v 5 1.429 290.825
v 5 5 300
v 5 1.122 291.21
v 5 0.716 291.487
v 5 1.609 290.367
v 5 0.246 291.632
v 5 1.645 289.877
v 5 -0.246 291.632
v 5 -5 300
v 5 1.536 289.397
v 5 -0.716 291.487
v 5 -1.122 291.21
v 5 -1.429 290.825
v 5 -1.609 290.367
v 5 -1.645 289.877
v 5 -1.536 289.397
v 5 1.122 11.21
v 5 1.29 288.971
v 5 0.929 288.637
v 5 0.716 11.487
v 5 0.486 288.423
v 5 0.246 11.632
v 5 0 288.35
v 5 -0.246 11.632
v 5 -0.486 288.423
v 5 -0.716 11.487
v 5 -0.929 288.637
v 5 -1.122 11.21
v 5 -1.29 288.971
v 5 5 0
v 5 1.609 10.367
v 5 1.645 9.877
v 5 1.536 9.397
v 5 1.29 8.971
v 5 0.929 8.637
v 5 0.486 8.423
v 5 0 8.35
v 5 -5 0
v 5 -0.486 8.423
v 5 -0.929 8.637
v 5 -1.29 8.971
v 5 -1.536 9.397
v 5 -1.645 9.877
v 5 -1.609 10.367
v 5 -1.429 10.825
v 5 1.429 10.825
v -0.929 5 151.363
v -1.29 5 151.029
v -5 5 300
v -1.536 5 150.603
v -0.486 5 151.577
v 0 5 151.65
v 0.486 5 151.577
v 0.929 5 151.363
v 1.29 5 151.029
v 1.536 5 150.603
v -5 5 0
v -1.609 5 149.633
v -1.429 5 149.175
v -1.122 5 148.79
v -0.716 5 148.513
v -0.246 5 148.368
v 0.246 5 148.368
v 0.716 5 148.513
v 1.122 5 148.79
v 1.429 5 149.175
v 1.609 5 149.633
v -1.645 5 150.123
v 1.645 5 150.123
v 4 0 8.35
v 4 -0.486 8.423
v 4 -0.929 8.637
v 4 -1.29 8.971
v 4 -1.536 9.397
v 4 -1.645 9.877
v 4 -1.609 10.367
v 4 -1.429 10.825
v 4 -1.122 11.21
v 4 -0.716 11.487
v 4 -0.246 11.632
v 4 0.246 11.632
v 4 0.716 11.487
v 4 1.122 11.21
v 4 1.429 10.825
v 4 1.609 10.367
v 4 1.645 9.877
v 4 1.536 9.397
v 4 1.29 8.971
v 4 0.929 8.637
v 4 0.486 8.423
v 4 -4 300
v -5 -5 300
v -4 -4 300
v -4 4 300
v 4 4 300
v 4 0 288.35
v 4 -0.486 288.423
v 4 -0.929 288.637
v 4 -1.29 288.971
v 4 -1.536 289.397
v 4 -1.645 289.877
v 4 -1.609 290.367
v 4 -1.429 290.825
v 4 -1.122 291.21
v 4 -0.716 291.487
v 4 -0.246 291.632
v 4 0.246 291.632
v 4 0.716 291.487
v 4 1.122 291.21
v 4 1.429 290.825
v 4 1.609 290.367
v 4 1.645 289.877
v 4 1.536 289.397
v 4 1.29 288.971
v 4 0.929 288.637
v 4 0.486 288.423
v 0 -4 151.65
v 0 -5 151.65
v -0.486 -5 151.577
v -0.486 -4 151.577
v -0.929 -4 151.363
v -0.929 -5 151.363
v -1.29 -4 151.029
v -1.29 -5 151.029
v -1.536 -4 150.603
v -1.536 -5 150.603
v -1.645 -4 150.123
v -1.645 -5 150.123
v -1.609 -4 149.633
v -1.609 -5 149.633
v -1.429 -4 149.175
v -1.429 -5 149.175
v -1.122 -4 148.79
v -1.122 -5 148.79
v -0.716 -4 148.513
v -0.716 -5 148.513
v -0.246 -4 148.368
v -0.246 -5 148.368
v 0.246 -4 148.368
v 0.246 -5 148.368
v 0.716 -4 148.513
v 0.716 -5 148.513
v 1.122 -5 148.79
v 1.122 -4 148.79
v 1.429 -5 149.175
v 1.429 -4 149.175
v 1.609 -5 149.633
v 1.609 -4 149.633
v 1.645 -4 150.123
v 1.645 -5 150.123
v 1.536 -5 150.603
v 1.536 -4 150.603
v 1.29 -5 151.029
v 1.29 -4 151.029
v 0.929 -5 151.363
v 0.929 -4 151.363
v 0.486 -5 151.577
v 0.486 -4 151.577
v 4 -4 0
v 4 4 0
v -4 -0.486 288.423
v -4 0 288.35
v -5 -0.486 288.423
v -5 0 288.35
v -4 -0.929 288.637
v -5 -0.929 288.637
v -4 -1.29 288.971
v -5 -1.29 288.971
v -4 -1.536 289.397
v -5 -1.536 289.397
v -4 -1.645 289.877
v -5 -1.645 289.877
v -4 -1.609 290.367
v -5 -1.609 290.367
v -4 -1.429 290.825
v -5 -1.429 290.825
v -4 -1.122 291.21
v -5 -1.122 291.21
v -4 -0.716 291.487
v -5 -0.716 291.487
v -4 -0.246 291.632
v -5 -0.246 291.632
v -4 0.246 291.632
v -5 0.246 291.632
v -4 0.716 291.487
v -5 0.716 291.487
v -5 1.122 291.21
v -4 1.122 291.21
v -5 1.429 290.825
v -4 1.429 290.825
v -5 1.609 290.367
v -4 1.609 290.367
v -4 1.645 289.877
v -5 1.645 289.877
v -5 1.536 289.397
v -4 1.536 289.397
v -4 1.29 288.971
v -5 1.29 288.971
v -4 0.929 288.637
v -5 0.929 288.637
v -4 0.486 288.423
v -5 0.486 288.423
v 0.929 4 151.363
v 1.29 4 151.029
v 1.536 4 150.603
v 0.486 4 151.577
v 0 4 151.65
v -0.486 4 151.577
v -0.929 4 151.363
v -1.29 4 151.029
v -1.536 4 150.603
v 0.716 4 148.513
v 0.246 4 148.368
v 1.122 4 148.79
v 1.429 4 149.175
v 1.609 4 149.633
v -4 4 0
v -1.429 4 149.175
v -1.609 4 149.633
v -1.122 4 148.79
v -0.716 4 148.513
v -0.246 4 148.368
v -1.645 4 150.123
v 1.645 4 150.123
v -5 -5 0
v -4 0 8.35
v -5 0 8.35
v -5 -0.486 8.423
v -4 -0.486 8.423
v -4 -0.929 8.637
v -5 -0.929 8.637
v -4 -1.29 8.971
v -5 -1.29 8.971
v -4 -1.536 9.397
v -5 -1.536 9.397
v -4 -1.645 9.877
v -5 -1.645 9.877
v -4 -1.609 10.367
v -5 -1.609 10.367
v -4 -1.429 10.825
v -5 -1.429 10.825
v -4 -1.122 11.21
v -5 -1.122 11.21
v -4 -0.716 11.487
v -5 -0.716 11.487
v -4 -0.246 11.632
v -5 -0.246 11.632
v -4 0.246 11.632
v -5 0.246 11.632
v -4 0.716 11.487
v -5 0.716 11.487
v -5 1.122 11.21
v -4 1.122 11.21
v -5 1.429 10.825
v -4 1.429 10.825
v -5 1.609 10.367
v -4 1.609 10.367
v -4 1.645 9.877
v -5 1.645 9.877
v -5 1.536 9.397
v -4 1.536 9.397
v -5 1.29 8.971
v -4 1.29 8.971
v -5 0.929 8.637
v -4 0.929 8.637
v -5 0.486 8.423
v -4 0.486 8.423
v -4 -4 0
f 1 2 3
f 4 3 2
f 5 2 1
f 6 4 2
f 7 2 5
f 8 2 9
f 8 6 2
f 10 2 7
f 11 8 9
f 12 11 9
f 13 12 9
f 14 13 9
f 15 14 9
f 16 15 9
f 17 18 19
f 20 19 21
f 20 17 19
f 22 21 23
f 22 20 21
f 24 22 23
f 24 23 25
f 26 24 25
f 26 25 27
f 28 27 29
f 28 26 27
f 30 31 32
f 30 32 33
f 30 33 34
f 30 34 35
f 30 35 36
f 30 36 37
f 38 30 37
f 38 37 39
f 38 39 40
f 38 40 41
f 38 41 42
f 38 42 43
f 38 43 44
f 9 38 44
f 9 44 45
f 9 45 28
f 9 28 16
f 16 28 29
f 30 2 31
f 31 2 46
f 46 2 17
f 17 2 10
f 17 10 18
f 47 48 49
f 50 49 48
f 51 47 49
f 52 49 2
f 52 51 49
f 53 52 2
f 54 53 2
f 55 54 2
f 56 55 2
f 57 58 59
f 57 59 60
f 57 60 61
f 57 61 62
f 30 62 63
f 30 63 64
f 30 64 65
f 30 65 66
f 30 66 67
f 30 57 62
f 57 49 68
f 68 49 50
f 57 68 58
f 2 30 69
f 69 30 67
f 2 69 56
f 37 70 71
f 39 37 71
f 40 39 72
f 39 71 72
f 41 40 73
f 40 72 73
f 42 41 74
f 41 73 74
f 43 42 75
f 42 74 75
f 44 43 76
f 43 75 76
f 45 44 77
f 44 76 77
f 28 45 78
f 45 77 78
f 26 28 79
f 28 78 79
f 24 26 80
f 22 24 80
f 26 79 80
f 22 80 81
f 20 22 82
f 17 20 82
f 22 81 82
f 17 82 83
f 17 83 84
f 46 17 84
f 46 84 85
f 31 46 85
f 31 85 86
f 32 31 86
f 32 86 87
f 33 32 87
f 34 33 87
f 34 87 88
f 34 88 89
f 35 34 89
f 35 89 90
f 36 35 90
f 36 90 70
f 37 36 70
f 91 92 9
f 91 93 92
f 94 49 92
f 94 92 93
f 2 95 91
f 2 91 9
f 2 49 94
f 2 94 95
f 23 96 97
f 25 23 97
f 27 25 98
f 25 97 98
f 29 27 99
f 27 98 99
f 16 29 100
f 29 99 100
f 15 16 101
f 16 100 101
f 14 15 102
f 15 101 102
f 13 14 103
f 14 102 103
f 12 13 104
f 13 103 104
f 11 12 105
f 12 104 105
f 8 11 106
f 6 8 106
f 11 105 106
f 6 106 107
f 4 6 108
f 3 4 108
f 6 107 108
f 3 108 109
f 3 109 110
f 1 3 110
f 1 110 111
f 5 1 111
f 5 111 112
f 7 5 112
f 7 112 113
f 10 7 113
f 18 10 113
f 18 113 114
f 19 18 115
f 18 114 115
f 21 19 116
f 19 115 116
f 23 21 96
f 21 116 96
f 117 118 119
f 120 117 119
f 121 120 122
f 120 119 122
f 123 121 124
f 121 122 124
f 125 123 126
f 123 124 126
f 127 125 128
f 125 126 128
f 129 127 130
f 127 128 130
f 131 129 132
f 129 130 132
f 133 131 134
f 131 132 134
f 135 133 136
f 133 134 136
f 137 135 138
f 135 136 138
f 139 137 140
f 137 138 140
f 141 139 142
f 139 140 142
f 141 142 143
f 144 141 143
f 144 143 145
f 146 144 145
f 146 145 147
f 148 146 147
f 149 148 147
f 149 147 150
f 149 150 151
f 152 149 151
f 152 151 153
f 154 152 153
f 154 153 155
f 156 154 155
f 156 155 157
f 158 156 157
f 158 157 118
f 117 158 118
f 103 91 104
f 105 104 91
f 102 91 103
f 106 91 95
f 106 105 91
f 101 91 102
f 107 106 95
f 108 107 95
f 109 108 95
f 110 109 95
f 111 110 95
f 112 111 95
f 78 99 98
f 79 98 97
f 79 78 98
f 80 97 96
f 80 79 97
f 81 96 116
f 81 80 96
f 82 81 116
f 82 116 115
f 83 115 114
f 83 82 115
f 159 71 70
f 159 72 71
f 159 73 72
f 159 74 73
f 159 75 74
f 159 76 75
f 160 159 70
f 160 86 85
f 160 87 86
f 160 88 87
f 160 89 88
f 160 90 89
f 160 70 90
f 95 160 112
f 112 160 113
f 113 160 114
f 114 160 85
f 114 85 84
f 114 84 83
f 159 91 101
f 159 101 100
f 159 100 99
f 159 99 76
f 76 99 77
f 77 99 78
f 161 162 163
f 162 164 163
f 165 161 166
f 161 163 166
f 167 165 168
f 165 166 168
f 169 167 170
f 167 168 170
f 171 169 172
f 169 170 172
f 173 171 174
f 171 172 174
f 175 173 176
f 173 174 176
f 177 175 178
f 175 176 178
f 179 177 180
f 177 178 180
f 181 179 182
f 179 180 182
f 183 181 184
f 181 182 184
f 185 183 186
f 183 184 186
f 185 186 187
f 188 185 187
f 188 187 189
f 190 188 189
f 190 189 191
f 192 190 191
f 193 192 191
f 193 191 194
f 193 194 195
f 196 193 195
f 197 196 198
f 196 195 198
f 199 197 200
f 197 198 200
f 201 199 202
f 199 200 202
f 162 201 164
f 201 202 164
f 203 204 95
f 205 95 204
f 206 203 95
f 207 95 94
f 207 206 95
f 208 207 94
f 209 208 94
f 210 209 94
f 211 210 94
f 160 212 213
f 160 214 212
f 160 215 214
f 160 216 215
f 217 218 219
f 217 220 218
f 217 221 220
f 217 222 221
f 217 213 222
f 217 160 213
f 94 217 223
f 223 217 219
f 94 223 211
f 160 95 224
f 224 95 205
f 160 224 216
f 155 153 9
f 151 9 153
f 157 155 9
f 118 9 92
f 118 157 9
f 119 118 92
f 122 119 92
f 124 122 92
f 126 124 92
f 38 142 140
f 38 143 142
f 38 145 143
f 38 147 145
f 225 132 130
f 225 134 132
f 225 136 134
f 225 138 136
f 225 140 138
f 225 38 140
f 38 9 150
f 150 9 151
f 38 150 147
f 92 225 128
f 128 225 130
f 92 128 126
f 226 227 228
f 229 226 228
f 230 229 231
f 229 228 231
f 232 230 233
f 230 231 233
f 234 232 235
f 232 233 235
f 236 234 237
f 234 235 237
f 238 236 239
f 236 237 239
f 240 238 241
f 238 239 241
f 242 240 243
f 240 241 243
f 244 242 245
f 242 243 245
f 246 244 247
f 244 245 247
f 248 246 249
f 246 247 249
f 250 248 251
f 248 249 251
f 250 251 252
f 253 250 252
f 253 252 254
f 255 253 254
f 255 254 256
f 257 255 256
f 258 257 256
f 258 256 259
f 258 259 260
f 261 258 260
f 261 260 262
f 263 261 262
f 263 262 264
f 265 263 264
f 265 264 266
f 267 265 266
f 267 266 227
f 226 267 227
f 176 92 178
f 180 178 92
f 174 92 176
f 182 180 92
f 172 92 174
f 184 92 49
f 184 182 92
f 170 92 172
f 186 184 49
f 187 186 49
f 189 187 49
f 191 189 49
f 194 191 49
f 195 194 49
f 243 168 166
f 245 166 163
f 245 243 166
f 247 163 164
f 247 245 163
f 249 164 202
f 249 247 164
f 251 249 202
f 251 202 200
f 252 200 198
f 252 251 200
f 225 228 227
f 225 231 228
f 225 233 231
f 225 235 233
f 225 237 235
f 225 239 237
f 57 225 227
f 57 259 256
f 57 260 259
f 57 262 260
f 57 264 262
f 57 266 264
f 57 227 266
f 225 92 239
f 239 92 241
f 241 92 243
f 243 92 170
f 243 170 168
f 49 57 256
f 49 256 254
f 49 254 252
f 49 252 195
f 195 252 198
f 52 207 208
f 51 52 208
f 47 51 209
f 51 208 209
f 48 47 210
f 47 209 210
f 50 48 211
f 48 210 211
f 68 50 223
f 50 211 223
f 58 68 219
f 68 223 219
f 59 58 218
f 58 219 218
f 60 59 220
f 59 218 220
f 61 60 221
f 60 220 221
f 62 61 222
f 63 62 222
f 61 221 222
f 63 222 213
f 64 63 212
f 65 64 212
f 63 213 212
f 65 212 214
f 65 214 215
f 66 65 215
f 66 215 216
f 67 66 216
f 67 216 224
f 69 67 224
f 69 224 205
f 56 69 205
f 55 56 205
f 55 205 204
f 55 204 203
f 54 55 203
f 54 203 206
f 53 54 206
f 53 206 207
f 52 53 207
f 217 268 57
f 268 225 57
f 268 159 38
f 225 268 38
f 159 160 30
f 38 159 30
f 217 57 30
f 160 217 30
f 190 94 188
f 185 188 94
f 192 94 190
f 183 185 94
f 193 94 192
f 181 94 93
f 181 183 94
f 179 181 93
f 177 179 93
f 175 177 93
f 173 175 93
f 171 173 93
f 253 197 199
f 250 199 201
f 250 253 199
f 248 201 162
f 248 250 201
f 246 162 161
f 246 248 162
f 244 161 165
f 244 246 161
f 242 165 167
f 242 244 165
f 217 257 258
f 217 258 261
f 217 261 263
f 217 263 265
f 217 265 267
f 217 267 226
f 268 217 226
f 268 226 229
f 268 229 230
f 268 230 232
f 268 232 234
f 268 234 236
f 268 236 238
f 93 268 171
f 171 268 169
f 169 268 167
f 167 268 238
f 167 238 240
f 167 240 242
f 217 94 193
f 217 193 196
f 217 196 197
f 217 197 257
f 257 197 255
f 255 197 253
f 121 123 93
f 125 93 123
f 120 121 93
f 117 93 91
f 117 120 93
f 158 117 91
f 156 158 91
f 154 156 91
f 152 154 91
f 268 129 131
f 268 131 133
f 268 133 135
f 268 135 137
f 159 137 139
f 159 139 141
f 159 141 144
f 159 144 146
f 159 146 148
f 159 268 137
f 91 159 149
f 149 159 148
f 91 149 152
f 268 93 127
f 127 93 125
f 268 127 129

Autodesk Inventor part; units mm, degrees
ref_plane "YZ Plane" through (0, 0, 0) normal (1, 0, 0) x (0, 1, 0)
ref_plane "XZ Plane" through (0, 0, 0) normal (0, 1, 0) x (-1, 0, 0)
ref_plane "XY Plane" through (0, 0, 0) normal (0, 0, 1) x (1, 0, 0)
sketch "スケッチ1" plane through (0, 0, 0) normal (0, 0, 1) x (1, 0, 0)
  line L0 (5, -5) -> (-5, -5)
  line L1 (-5, -5) -> (-5, 5)
  line L2 (-5, 5) -> (5, 5)
  line L3 (5, 5) -> (5, -5)
  line L4 (5, -5) -> (-5, 5) construction
  line L5 (-5, -5) -> (5, 5) construction
  line L6 (4, 4) -> (-4, 4)
  line L7 (-4, 4) -> (-4, -4)
  line L8 (-4, -4) -> (4, -4)
  line L9 (4, -4) -> (4, 4)
  point P0 (0, 0)
  dimension "d0" = 10
  dimension "d1" = 10
  dimension "d2" = 1
extrude "押し出し1" add sketch "スケッチ1" along normal blind 300
sketch "スケッチ2" plane through (5, -5, 0) normal (1, 0, 0) x (0, 0, -1)
  line L0 (0, 0) -> (0, 10) projected
  line L1 (0, 10) -> (-300, 10) projected
  line L2 (-300, 0) -> (-300, 10) projected
  line L3 (0, 0) -> (-300, 0) projected
  line L4 (-300, 5) -> (0, 5)
  point P0 (-290, 5)
  point P1 (-10, 5)
  dimension "d5" = 280
  dimension "d7" = 10
hole "穴1" at (5, 0, 290) at (5, 0, 10) direction (-1, 0, 0) diameter 3.3 end through all
sketch "スケッチ3" plane through (-5, 5, 0) normal (0, 1, 0) x (1, 0, 0)
  line L0 (10, 0) -> (0, 0) projected
  line L1 (0, 0) -> (0, -300) projected
  line L2 (10, -300) -> (0, -300) projected
  line L3 (10, 0) -> (10, -300) projected
  line L4 (5, 0) -> (5, -300)
  point P0 (5, -150)
hole "穴2" at (0, 5, 150) direction (0, -1, 0) diameter 3.3 end through all
properties part number "kaku_1010_300"
